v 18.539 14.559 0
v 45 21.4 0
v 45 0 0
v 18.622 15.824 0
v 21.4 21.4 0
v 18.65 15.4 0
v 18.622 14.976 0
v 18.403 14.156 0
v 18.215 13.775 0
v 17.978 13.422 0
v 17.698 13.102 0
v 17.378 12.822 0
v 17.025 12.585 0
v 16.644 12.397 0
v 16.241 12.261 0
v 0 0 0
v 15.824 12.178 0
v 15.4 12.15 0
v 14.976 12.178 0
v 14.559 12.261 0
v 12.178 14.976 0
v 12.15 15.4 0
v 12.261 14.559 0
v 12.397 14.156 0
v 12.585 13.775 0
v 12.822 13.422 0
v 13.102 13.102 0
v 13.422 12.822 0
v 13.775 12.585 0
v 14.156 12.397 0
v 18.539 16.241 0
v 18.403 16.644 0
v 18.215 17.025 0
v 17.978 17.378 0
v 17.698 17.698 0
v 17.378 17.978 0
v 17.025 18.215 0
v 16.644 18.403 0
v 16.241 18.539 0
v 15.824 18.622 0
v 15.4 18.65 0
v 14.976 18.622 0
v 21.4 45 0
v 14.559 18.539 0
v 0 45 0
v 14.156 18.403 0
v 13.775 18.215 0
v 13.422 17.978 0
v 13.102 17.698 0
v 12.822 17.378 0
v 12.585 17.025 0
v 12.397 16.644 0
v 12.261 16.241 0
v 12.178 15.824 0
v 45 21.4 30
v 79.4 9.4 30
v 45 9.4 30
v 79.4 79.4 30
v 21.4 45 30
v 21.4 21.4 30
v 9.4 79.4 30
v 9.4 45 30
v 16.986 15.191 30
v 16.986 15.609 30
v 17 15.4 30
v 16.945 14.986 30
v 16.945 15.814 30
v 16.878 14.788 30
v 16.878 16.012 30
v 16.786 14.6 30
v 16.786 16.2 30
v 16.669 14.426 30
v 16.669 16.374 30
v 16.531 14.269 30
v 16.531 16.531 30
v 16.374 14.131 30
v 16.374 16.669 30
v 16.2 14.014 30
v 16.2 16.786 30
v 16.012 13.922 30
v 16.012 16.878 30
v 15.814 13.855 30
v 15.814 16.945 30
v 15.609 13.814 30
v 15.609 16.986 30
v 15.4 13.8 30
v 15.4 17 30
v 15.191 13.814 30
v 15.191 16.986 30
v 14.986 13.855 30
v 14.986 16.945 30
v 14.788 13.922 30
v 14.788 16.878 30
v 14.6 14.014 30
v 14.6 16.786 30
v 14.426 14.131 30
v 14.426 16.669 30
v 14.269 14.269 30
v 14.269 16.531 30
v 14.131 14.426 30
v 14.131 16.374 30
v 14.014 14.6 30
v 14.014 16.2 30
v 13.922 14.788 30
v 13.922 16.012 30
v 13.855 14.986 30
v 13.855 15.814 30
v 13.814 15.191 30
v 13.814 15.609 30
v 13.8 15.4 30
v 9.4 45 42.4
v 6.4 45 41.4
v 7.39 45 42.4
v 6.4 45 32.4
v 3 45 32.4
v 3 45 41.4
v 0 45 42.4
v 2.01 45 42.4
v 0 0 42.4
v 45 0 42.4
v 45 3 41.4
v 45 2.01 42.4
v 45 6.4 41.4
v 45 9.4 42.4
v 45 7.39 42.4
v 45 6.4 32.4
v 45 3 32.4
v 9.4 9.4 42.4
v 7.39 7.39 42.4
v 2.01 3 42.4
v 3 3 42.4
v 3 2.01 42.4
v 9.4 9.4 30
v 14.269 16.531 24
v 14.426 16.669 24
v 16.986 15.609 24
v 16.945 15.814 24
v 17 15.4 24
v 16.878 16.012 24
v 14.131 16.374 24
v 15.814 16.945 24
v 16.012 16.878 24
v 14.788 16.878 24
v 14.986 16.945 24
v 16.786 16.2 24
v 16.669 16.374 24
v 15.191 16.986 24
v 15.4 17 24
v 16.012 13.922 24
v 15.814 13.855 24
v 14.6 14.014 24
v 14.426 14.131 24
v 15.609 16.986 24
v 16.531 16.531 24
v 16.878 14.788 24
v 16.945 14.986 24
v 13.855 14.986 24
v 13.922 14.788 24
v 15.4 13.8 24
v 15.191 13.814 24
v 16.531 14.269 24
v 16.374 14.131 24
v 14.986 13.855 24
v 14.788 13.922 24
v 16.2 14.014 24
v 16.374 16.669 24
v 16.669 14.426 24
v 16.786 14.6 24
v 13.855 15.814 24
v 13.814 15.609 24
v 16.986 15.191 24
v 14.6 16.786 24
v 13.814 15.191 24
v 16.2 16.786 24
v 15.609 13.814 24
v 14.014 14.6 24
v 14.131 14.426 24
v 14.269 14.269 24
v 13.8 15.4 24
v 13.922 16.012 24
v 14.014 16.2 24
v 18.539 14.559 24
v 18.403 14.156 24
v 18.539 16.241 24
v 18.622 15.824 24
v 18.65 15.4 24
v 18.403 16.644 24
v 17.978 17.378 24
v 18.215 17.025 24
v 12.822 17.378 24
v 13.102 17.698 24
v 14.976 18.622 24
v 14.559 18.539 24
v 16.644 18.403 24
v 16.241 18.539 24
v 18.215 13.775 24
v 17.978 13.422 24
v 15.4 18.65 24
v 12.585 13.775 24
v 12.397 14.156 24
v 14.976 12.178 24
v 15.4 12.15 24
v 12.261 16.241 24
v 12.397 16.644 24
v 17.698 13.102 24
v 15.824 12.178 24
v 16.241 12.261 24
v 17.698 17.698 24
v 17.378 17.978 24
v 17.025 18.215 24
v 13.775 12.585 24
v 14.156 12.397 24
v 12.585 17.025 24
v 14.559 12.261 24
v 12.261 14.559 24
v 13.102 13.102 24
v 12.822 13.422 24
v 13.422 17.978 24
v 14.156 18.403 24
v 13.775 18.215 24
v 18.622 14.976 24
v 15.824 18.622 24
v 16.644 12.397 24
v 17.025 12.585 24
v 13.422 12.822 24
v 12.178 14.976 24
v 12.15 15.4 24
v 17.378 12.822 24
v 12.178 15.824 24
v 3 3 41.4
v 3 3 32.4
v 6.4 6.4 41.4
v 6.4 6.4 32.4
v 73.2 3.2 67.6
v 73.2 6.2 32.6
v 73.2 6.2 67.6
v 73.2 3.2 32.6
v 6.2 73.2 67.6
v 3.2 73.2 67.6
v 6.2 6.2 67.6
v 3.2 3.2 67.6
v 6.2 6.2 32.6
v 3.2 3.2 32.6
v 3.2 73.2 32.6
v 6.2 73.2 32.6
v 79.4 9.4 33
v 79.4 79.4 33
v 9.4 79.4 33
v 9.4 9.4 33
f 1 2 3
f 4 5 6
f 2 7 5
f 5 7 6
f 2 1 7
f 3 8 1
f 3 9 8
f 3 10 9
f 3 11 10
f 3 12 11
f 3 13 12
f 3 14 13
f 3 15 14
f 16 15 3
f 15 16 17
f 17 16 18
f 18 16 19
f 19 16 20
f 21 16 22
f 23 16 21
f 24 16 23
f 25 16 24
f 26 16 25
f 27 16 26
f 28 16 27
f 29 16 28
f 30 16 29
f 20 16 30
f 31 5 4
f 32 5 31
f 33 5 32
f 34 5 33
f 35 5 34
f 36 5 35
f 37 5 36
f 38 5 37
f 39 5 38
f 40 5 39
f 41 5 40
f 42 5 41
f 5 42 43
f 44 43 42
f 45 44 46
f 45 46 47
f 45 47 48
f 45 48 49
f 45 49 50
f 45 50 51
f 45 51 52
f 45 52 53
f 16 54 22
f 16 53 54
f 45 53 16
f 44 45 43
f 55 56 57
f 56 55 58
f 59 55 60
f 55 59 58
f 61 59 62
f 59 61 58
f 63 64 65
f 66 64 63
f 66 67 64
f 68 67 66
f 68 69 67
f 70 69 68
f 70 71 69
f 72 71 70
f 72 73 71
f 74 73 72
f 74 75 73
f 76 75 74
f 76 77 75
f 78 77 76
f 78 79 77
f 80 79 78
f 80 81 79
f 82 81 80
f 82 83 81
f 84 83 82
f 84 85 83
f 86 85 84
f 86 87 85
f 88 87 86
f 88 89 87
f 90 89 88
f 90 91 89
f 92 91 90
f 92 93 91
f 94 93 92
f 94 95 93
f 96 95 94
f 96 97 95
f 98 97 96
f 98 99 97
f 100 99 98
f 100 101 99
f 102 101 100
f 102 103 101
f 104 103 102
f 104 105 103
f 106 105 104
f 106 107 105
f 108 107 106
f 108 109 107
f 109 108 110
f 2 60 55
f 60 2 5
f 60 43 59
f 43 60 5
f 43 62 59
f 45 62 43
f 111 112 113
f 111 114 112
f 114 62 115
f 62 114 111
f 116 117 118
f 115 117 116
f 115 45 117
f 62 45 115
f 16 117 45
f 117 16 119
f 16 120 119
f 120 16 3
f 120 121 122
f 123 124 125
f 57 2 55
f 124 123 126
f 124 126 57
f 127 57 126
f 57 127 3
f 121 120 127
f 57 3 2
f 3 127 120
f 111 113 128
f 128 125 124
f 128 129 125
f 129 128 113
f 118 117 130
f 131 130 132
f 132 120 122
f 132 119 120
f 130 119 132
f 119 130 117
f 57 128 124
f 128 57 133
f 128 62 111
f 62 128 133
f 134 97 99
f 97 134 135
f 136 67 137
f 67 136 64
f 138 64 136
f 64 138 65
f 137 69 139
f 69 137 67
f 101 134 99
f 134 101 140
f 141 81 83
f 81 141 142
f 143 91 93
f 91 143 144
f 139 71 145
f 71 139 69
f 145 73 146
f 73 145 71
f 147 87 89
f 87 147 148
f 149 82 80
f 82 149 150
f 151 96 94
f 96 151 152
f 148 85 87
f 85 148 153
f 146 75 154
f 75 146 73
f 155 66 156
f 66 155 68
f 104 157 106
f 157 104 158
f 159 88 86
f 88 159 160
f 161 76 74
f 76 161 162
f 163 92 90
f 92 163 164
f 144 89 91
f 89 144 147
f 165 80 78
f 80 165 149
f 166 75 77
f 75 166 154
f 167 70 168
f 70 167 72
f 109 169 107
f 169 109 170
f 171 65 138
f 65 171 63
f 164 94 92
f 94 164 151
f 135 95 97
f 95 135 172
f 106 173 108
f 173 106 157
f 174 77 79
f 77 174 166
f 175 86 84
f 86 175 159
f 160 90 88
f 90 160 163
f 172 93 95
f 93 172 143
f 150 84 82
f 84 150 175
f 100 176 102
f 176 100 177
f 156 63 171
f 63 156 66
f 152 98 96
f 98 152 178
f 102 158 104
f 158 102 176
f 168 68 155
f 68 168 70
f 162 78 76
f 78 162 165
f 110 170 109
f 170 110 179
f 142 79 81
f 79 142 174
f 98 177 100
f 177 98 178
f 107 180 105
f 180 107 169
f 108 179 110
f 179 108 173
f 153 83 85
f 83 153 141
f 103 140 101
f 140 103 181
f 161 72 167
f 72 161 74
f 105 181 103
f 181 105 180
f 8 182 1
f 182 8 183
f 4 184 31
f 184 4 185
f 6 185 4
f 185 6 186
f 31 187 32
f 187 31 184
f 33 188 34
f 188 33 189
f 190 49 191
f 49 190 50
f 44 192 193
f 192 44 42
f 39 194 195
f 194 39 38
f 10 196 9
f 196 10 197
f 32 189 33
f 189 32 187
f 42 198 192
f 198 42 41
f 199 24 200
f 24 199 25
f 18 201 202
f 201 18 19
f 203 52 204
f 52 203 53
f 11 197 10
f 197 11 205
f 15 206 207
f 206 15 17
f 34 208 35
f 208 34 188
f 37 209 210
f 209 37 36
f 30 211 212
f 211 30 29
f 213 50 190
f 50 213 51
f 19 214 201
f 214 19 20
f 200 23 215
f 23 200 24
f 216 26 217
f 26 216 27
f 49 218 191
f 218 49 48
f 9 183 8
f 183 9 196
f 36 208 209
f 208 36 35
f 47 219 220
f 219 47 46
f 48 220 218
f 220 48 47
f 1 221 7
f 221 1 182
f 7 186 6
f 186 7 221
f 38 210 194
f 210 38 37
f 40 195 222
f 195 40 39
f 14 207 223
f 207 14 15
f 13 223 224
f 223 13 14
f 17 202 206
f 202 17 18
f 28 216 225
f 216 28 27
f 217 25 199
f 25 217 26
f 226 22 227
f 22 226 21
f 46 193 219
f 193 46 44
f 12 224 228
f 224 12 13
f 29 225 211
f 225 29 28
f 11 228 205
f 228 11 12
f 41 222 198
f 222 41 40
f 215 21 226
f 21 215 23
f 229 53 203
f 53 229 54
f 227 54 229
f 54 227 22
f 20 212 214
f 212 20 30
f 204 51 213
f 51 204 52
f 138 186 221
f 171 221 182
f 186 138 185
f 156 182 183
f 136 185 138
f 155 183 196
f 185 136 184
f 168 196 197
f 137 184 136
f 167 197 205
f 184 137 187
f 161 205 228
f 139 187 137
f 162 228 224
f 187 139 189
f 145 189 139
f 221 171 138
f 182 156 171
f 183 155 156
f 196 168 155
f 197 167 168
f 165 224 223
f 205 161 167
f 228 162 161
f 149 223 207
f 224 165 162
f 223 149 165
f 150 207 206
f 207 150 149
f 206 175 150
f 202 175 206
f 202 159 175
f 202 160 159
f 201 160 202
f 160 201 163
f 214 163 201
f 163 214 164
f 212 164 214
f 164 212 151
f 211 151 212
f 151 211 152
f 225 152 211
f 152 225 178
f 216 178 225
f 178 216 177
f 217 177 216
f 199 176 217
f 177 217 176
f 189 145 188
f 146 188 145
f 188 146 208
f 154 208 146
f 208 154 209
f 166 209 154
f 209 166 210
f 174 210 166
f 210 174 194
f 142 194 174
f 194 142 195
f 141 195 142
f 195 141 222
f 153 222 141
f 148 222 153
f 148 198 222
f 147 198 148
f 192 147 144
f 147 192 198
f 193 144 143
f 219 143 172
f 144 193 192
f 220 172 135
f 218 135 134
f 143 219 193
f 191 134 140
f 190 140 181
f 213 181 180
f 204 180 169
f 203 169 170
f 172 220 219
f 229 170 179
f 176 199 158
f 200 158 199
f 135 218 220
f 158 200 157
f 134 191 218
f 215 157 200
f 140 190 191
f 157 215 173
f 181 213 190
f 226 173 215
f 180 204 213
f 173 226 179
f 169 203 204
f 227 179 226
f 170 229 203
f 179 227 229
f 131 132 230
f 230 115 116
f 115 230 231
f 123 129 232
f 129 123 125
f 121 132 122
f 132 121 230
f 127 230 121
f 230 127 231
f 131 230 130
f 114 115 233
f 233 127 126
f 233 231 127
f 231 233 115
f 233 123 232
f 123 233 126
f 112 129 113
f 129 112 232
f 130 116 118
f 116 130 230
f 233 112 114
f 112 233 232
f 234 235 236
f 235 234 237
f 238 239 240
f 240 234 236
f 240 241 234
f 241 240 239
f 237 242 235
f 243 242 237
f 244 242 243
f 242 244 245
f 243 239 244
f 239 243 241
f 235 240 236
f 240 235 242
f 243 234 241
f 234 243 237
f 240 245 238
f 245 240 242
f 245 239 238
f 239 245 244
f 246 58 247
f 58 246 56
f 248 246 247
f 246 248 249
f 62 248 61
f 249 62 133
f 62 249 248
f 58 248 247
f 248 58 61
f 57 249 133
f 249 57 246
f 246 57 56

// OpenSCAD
// file: canto_pe_cupula.scad
// =====================================================================
//  Peça de canto da maquete — pé de 3 cm + apoio da base + encaixe da cúpula
//  Imprimir 4 peças em PLA (são iguais e simétricas — servem nos 4 cantos).
//
//  Ideia:
//    - Embaixo: pé de 30 mm que levanta a base.
//    - Meio: degrau (rebaixo) em L onde o canto da base apoia.
//    - Em cima: canaleta em L onde a parede da cúpula encaixa.
//      A canaleta em 90° força a cúpula a ficar no esquadro.
//
//  Todas as medidas em mm. Ajuste os parâmetros com as medidas reais.
// =====================================================================

/* [Medidas das peças existentes] */
espessura_base    = 3;    // espessura da chapa da base (MDF/acrílico)
espessura_cupula  = 3;    // espessura da parede da cúpula

/* [Folgas para PLA] */
folga_base   = 0.4;       // folga vertical/lateral da base
folga_cupula = 0.4;       // folga total da canaleta (largura = parede + folga)

/* [Geometria da peça] */
altura_pe          = 30;  // pé de 3 cm (do chão até a face de baixo da base)
comprimento_braco  = 45;  // comprimento de cada braço do L
parede_externa     = 3;   // parede de fora da canaleta (acabamento externo)
parede_interna     = 3;   // parede entre a canaleta e a borda da base
largura_apoio_base = 12;  // quanto a base apoia em cima do pé
profundidade_canal = 10;  // quanto a parede da cúpula entra na canaleta
chanfro_canal      = 1;   // chanfro na entrada da canaleta (facilita encaixe)
altura_acima_base  = 9;   // altura das paredes acima da face de cima da base

/* [Furo para parafuso (opcional)] */
usar_furo        = true;
diam_furo        = 3.2;   // M3 / parafuso de madeira 3 mm
diam_cabeca      = 6.5;
carne_furo       = 6;     // material sob a base no furo (o resto é rebaixo por baixo)

$fn = 48;

// ---------- medidas derivadas ----------
largura_canal = espessura_cupula + folga_cupula;
u_canal_ini   = parede_externa;
u_canal_fim   = parede_externa + largura_canal;
u_borda_base  = u_canal_fim + parede_interna;          // onde fica a borda da base
largura_total = u_borda_base + largura_apoio_base;
z_topo        = altura_pe + espessura_base + folga_base + altura_acima_base;
z_fundo_canal = z_topo - profundidade_canal;
A = comprimento_braco;

echo(str("Altura total da peça: ", z_topo, " mm"));
echo(str("Largura da canaleta: ", largura_canal, " mm"));
echo(str("Base recuada da face externa da peça: ", u_borda_base, " mm"));
echo(str("=> Cúpula externa = Base + ", 2*(u_borda_base - u_canal_ini - folga_cupula/2), " mm"));

// região em L com largura w (canto externo na origem)
module L2d(w) {
    union() {
        square([A, w]);
        square([w, A]);
    }
}

// um braço da canaleta (seção com chanfro), correndo ao longo de X
module canal_braco() {
    translate([u_canal_ini, 0, 0])   // começa no canto da canaleta
    rotate([90, 0, 90])
    linear_extrude(A + 1)
    polygon([
        [u_canal_ini,               z_fundo_canal],
        [u_canal_fim,               z_fundo_canal],
        [u_canal_fim,               z_topo - chanfro_canal],
        [u_canal_fim + chanfro_canal, z_topo + 0.01],
        [u_canal_fim + chanfro_canal, z_topo + 1],
        [u_canal_ini - chanfro_canal, z_topo + 1],
        [u_canal_ini - chanfro_canal, z_topo + 0.01],
        [u_canal_ini,               z_topo - chanfro_canal],
    ]);
}

module peca_canto() {
    difference() {
        union() {
            // pé + apoio da base
            linear_extrude(altura_pe) L2d(largura_total);
            // paredes (externa + canaleta + interna) até o topo
            linear_extrude(z_topo) L2d(u_borda_base);
        }
        // canaleta em L (dois braços se cruzando no canto)
        canal_braco();
        mirror([1, -1, 0]) canal_braco();

        // furo de fixação da base (no meio do apoio, na diagonal)
        if (usar_furo) {
            c = u_borda_base + largura_apoio_base / 2;
            translate([c, c, -1]) cylinder(d = diam_furo, h = altura_pe + 2);
            translate([c, c, -1]) cylinder(d = diam_cabeca, h = altura_pe - carne_furo + 1);
        }
    }
}

peca_canto();
// main file
// Só para visualizar: peça de canto + pedaço da base + pedaço da cúpula.
// (não imprimir este arquivo)
include <canto_pe_cupula.scad>   // já desenha a peça de canto

trecho = 70;   // pedaço de base/cúpula mostrado

// base (chapa) apoiada no degrau
color("burlywood")
translate([u_borda_base, u_borda_base, altura_pe])
    cube([trecho, trecho, espessura_base]);

// paredes da cúpula entrando na canaleta
color("lightskyblue", 0.55)
translate([0, 0, z_fundo_canal + 0.2]) {
    translate([u_canal_ini + folga_cupula/2, u_canal_ini + folga_cupula/2, 0])
        cube([trecho, espessura_cupula, 35]);
    translate([u_canal_ini + folga_cupula/2, u_canal_ini + folga_cupula/2, 0])
        cube([espessura_cupula, trecho, 35]);
}
